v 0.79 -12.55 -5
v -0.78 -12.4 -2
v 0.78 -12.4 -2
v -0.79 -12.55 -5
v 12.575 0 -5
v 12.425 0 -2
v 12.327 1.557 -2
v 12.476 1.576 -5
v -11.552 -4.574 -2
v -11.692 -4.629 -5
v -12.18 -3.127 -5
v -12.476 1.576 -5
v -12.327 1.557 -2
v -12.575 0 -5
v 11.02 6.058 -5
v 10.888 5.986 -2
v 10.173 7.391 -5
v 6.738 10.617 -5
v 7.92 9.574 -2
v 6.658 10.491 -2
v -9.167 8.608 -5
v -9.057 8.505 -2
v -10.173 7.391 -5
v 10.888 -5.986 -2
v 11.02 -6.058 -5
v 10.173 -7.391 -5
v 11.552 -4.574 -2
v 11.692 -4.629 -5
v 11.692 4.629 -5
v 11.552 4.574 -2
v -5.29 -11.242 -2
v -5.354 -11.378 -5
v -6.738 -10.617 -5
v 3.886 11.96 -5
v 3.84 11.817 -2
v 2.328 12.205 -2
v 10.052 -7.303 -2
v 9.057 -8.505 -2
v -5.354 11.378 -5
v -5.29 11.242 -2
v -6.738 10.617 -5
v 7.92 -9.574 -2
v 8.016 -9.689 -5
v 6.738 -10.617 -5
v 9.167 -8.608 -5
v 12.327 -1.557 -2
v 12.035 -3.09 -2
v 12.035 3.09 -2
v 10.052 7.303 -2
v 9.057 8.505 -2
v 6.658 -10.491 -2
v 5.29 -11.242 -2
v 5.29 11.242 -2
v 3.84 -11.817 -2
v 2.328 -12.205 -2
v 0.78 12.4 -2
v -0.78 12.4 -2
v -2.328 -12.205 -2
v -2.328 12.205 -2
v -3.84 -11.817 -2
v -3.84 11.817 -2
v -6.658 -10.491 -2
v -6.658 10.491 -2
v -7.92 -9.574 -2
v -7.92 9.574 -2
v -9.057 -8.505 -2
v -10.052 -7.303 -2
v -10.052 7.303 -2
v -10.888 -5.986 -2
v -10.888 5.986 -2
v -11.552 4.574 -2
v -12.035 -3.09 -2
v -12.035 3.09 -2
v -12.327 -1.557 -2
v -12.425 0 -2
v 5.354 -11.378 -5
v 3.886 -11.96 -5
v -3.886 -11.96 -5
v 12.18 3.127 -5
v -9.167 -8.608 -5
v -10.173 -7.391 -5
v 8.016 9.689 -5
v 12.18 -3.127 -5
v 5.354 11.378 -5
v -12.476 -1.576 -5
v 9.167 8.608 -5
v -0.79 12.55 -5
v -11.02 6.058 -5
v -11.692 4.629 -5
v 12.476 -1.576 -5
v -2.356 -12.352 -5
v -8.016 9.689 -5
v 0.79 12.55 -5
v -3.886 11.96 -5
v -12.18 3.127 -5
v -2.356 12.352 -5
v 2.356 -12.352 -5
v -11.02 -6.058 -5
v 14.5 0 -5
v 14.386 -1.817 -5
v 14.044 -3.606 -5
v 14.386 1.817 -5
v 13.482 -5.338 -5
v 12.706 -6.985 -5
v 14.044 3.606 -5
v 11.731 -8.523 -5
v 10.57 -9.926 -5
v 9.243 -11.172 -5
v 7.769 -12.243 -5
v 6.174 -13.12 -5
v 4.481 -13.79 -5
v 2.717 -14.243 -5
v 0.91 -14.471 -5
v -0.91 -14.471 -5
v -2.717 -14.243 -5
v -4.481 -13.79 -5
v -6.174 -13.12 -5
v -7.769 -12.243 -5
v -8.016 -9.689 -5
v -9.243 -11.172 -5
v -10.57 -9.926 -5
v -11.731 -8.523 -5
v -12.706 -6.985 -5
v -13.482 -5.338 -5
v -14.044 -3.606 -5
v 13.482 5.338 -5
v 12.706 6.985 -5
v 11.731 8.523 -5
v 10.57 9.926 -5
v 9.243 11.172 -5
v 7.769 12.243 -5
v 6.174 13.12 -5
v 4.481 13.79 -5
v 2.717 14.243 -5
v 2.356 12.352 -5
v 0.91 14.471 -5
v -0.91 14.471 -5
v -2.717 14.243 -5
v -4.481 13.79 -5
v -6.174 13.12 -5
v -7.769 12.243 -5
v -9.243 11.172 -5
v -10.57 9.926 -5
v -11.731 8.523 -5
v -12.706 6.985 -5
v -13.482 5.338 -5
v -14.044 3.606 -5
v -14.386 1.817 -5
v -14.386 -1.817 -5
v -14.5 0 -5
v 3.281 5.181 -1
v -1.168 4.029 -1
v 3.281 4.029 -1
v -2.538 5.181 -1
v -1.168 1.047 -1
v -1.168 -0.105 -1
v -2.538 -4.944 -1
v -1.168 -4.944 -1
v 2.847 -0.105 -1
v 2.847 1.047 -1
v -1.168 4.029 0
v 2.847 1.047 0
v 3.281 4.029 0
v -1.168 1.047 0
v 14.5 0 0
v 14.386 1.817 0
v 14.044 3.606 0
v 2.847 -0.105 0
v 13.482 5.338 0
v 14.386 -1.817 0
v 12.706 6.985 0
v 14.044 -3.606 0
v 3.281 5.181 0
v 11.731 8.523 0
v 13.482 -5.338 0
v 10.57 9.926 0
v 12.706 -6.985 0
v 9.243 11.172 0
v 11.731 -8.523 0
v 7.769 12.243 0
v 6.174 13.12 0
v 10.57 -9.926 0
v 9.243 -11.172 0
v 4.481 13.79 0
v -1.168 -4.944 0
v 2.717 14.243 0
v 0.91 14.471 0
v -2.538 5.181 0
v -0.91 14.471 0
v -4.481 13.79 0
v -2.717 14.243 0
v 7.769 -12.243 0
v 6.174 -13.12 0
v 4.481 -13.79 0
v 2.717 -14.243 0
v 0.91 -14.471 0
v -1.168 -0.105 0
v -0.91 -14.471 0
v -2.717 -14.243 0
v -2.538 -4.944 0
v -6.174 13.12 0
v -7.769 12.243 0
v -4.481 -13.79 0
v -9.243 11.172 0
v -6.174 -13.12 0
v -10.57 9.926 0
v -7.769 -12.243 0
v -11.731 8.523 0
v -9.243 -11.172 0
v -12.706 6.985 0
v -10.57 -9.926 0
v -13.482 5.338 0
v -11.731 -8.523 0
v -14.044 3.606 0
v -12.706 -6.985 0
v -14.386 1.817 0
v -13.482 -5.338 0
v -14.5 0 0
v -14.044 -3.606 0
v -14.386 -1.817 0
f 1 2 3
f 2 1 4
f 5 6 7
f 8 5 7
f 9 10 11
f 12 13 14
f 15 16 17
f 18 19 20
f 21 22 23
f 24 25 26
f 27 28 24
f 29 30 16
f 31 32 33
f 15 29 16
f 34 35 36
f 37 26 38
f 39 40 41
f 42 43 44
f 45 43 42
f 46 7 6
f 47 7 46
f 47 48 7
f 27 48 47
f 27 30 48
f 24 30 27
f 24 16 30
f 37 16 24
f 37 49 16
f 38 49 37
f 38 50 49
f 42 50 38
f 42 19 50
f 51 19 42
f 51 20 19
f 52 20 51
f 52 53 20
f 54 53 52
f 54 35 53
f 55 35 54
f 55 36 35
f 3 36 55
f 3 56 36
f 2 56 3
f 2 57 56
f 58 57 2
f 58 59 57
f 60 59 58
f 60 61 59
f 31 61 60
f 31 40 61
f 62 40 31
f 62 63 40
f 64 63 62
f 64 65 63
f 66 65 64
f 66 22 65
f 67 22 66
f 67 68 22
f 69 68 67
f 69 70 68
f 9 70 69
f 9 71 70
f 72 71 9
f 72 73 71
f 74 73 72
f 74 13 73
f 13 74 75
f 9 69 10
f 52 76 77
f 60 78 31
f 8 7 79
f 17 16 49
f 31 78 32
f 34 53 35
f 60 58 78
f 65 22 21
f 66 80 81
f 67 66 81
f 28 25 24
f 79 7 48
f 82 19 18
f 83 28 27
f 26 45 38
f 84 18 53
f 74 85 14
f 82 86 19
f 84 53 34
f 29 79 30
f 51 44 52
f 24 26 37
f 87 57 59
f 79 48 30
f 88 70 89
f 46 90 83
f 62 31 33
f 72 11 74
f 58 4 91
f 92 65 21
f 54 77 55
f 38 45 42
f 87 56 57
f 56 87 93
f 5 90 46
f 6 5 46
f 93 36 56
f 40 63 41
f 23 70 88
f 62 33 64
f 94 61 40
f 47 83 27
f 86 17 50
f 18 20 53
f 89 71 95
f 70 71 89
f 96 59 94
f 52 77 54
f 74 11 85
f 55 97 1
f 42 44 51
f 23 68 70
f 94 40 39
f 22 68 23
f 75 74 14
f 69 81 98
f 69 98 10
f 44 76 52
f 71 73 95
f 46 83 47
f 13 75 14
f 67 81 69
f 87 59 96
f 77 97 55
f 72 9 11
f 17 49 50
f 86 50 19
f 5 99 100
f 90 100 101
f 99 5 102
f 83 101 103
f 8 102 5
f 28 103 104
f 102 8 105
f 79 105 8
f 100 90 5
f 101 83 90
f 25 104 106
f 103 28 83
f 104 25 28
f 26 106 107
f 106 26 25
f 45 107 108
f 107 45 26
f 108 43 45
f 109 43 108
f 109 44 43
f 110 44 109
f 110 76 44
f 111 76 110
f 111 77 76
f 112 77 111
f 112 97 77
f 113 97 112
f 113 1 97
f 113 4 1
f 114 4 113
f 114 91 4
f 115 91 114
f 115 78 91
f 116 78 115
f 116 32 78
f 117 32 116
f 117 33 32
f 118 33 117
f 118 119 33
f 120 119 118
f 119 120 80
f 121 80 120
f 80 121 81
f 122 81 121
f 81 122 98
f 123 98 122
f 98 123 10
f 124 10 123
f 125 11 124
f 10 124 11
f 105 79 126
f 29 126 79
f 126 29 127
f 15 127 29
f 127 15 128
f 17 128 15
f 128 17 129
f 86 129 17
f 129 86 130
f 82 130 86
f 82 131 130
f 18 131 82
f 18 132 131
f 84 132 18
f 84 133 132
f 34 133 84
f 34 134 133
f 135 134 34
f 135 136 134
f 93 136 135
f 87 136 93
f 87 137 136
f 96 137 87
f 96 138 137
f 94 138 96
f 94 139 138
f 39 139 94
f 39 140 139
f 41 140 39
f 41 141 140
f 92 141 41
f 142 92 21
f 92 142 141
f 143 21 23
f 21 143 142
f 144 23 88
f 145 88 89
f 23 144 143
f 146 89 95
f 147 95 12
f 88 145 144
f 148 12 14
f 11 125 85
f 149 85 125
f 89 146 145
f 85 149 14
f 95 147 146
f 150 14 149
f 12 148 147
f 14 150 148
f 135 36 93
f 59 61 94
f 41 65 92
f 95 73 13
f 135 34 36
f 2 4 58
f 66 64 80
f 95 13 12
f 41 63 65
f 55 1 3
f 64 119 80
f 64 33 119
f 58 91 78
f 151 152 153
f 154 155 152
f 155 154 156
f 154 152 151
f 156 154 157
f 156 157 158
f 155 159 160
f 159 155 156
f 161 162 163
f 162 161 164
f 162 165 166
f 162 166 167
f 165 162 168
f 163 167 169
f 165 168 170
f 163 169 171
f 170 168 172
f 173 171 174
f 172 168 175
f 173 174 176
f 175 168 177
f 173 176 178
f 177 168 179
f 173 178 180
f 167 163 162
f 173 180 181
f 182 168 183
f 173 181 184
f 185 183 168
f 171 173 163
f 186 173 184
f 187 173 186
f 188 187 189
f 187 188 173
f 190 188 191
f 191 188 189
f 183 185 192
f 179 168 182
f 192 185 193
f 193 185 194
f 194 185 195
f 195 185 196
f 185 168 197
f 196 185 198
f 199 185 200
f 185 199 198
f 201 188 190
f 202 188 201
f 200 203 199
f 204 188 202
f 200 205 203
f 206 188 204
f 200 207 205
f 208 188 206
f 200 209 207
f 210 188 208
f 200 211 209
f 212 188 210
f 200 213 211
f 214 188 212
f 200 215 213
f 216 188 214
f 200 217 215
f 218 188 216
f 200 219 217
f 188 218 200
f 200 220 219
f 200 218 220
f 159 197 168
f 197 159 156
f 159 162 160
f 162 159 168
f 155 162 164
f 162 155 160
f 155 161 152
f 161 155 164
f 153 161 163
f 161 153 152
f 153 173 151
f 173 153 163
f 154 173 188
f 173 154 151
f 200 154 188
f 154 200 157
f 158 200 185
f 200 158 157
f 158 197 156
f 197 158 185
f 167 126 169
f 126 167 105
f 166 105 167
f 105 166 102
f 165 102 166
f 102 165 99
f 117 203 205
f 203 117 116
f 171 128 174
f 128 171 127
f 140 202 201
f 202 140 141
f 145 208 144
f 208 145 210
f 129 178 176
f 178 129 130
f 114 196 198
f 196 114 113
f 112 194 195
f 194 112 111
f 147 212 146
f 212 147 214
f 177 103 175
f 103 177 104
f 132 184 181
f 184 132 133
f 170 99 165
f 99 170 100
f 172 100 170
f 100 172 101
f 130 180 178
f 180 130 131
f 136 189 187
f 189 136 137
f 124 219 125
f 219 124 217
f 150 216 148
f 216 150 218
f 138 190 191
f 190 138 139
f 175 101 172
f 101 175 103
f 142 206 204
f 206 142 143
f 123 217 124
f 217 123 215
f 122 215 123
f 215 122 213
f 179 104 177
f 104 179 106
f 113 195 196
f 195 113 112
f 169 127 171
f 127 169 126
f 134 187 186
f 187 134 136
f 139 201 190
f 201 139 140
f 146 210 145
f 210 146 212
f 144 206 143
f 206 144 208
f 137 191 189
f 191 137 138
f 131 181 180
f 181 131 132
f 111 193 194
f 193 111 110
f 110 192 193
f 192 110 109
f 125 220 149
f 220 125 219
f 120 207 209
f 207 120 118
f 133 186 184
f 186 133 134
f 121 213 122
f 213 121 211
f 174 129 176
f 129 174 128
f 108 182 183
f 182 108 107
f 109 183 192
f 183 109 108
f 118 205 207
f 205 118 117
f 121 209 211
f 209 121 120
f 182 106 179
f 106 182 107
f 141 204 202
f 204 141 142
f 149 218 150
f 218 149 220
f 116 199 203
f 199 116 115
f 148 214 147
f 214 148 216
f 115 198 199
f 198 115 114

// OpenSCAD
$fn = 50;

difference() {
	union() {
		translate(v = [0, 0, -5.0]) {
			cylinder(h = 5, r = 14.5);
		}
	}
	union() {
		#translate(v = [0, 0, -5.0]) {
			cylinder(h = 3, r1 = 12.575, r2 = 12.425);
		}
		translate(v = [0, 0, -1]) {
			linear_extrude(height = 1) {
				text(font = "Impact", halign = "center", size = 10, text = "F", valign = "center");
			}
		}
	}
}
